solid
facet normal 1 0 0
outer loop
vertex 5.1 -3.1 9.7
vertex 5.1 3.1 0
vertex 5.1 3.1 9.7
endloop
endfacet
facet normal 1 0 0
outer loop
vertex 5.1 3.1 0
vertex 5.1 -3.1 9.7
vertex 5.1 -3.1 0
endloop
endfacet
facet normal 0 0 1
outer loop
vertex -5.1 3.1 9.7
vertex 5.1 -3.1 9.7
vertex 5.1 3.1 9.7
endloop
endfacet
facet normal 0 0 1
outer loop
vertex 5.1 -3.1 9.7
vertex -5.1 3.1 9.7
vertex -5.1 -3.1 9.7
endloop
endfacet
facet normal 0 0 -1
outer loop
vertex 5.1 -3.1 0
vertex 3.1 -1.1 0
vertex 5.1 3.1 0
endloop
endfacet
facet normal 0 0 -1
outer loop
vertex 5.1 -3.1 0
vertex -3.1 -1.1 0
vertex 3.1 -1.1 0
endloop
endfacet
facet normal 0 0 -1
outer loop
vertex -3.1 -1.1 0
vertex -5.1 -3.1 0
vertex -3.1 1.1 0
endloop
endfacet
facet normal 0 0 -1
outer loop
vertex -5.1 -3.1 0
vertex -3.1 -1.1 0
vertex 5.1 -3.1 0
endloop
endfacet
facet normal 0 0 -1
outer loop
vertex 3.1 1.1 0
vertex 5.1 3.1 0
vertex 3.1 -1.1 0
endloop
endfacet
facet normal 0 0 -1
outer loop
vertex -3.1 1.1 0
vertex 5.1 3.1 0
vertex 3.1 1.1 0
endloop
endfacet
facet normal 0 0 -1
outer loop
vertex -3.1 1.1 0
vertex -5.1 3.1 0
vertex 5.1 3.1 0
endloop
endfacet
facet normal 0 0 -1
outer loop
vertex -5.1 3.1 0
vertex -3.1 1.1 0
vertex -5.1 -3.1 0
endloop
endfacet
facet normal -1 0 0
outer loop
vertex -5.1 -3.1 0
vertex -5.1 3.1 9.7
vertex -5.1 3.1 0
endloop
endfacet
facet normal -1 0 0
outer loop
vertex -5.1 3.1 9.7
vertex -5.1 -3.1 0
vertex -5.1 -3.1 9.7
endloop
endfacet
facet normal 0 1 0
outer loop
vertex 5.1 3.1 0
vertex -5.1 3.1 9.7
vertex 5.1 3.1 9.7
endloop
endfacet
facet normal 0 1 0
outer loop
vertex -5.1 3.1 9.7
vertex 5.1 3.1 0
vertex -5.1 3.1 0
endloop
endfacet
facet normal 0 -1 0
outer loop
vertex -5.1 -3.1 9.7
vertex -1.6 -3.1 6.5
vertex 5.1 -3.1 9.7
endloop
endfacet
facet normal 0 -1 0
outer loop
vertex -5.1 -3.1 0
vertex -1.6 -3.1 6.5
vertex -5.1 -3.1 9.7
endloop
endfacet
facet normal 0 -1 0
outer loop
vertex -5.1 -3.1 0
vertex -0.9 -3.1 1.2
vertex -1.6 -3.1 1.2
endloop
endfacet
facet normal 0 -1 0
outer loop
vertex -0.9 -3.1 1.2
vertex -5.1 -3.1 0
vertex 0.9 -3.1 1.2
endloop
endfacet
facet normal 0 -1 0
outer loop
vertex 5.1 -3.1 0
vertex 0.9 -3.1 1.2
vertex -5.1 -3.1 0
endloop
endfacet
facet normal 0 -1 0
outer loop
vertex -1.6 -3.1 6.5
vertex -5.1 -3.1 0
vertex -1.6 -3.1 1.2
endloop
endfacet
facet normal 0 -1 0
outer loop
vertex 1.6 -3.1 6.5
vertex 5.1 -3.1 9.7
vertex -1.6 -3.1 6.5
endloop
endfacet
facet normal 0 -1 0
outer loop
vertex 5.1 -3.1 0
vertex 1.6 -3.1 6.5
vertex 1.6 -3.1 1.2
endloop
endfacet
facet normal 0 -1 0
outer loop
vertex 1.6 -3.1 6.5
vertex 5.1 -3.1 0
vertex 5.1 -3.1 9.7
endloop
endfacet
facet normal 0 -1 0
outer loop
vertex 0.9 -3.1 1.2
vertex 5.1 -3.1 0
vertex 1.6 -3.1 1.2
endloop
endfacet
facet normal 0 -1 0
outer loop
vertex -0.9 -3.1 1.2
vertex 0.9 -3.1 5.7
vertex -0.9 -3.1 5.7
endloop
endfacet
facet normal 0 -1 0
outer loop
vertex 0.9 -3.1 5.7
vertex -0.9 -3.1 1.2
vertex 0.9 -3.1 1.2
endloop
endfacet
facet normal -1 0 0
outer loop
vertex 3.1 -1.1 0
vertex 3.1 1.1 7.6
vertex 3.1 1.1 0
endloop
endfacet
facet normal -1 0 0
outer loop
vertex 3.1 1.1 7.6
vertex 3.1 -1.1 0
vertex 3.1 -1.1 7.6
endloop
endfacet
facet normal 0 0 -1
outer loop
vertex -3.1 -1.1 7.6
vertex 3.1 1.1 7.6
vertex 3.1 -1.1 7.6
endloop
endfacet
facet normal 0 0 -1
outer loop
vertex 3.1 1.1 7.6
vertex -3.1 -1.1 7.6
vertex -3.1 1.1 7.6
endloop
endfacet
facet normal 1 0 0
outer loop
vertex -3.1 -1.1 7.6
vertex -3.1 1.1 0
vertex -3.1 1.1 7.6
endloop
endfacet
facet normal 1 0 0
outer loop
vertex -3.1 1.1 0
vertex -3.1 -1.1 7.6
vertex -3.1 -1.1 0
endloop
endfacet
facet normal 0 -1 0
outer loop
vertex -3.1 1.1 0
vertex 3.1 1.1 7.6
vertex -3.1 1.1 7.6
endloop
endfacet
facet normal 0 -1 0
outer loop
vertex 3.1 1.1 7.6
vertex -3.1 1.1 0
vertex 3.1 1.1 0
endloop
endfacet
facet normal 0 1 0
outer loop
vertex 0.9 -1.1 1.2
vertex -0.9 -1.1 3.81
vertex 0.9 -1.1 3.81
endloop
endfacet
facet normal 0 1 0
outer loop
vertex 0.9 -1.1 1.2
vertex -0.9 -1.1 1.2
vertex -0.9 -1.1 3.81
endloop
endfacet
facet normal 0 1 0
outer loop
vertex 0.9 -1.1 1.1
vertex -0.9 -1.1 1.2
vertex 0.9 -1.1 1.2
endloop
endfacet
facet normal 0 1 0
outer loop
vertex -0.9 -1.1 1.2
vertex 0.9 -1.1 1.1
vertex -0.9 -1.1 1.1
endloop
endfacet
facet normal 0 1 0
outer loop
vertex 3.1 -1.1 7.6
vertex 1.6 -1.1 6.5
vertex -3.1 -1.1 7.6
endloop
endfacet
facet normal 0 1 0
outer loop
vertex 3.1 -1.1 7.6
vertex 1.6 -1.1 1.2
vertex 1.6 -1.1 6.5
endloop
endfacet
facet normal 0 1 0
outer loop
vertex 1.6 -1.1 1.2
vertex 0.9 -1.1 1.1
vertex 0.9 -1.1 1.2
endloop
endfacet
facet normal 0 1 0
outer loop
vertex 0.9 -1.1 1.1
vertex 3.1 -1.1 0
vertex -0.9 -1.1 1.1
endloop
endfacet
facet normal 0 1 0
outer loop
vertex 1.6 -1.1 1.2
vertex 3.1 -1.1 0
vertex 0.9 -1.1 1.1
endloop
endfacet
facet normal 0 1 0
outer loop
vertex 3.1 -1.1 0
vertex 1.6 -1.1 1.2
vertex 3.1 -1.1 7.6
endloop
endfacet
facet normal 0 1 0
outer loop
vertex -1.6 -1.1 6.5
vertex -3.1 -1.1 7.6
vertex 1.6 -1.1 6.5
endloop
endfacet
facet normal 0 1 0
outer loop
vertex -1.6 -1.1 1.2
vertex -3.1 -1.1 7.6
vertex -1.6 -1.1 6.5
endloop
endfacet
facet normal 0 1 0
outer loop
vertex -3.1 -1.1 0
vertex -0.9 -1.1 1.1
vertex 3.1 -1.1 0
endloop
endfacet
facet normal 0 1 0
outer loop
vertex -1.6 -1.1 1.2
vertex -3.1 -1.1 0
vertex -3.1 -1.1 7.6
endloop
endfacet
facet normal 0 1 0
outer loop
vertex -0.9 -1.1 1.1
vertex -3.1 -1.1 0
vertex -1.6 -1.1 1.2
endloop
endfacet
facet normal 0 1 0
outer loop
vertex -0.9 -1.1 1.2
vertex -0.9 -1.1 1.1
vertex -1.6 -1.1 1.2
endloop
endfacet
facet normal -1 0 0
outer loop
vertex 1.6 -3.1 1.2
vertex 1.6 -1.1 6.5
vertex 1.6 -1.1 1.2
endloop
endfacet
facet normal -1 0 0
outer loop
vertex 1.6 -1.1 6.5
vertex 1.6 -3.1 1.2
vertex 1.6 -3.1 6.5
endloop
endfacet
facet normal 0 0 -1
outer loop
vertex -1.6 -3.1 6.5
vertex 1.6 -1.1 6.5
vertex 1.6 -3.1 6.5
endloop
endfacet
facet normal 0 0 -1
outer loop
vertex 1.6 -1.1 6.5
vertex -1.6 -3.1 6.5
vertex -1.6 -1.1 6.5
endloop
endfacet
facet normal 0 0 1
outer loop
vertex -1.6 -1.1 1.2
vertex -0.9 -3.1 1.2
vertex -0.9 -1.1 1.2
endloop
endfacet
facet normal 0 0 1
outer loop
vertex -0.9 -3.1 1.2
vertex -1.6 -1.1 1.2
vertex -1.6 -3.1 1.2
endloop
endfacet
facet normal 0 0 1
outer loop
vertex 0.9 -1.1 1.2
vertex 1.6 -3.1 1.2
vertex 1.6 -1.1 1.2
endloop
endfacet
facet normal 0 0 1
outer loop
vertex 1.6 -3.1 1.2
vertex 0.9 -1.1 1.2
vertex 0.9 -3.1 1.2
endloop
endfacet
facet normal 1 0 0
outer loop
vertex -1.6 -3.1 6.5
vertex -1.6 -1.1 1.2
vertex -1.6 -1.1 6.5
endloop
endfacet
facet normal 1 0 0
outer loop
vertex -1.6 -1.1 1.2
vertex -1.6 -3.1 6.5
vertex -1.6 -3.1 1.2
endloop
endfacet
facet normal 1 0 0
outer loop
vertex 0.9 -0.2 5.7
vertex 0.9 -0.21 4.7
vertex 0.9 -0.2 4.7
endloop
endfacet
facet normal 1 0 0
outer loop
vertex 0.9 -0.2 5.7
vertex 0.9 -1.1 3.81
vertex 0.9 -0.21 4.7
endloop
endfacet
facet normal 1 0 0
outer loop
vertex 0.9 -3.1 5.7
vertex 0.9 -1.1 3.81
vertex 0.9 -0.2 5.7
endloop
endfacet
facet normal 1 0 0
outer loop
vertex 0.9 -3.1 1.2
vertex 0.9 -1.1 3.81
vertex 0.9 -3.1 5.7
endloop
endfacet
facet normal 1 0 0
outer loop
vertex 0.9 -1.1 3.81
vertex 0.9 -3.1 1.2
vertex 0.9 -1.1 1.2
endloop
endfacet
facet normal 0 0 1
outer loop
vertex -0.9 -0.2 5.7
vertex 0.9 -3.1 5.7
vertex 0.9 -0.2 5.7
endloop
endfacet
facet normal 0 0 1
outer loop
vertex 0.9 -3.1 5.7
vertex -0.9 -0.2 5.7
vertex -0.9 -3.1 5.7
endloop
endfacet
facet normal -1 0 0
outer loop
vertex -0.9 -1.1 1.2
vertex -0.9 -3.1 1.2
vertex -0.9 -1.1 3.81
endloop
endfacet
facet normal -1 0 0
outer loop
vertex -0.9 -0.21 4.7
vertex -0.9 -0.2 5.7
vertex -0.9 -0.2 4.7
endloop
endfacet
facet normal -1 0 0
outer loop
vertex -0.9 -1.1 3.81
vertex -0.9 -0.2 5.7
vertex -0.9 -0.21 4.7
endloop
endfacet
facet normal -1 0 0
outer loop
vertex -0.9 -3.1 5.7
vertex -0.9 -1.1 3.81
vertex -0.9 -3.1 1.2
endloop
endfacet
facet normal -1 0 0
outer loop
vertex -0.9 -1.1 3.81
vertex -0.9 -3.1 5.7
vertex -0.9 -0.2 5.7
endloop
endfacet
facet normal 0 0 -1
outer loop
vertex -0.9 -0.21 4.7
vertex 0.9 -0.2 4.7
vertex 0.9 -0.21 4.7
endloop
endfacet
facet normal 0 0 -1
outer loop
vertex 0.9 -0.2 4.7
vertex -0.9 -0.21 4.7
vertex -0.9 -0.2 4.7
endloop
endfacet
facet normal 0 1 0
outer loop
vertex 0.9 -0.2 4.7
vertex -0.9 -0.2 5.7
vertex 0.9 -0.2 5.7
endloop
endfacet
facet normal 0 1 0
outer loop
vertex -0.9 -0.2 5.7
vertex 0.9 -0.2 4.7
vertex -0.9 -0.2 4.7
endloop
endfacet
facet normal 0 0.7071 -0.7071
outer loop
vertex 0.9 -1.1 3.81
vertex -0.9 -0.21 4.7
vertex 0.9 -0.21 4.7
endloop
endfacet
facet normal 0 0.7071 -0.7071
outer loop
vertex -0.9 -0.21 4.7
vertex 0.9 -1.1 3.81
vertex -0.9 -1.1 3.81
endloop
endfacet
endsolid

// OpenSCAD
/*
    This file is part of the DodoHand project. This project aims to create 
    an open implementation of the DataHand keyboard, capable of being created
    with commercial 3D printing services.

    Copyright (C) 2014 Scott Fohey

    This program is free software: you can redistribute it and/or modify
    it under the terms of the GNU General Public License as published by
    the Free Software Foundation, either version 3 of the License, or
    (at your option) any later version.

    This program is distributed in the hope that it will be useful,
    but WITHOUT ANY WARRANTY; without even the implied warranty of
    MERCHANTABILITY or FITNESS FOR A PARTICULAR PURPOSE.  See the
    GNU General Public License for more details.

    You should have received a copy of the GNU General Public License
    along with this program.  If not, see <http://www.gnu.org/licenses/>.
*/

use <trp.scad>;
use <carrier.scad>;
use <LiteOn_P_100_E302.scad>;
use <tf.scad>;

include <dimensions.scad>;

keycapbase(0, 0, 0);
